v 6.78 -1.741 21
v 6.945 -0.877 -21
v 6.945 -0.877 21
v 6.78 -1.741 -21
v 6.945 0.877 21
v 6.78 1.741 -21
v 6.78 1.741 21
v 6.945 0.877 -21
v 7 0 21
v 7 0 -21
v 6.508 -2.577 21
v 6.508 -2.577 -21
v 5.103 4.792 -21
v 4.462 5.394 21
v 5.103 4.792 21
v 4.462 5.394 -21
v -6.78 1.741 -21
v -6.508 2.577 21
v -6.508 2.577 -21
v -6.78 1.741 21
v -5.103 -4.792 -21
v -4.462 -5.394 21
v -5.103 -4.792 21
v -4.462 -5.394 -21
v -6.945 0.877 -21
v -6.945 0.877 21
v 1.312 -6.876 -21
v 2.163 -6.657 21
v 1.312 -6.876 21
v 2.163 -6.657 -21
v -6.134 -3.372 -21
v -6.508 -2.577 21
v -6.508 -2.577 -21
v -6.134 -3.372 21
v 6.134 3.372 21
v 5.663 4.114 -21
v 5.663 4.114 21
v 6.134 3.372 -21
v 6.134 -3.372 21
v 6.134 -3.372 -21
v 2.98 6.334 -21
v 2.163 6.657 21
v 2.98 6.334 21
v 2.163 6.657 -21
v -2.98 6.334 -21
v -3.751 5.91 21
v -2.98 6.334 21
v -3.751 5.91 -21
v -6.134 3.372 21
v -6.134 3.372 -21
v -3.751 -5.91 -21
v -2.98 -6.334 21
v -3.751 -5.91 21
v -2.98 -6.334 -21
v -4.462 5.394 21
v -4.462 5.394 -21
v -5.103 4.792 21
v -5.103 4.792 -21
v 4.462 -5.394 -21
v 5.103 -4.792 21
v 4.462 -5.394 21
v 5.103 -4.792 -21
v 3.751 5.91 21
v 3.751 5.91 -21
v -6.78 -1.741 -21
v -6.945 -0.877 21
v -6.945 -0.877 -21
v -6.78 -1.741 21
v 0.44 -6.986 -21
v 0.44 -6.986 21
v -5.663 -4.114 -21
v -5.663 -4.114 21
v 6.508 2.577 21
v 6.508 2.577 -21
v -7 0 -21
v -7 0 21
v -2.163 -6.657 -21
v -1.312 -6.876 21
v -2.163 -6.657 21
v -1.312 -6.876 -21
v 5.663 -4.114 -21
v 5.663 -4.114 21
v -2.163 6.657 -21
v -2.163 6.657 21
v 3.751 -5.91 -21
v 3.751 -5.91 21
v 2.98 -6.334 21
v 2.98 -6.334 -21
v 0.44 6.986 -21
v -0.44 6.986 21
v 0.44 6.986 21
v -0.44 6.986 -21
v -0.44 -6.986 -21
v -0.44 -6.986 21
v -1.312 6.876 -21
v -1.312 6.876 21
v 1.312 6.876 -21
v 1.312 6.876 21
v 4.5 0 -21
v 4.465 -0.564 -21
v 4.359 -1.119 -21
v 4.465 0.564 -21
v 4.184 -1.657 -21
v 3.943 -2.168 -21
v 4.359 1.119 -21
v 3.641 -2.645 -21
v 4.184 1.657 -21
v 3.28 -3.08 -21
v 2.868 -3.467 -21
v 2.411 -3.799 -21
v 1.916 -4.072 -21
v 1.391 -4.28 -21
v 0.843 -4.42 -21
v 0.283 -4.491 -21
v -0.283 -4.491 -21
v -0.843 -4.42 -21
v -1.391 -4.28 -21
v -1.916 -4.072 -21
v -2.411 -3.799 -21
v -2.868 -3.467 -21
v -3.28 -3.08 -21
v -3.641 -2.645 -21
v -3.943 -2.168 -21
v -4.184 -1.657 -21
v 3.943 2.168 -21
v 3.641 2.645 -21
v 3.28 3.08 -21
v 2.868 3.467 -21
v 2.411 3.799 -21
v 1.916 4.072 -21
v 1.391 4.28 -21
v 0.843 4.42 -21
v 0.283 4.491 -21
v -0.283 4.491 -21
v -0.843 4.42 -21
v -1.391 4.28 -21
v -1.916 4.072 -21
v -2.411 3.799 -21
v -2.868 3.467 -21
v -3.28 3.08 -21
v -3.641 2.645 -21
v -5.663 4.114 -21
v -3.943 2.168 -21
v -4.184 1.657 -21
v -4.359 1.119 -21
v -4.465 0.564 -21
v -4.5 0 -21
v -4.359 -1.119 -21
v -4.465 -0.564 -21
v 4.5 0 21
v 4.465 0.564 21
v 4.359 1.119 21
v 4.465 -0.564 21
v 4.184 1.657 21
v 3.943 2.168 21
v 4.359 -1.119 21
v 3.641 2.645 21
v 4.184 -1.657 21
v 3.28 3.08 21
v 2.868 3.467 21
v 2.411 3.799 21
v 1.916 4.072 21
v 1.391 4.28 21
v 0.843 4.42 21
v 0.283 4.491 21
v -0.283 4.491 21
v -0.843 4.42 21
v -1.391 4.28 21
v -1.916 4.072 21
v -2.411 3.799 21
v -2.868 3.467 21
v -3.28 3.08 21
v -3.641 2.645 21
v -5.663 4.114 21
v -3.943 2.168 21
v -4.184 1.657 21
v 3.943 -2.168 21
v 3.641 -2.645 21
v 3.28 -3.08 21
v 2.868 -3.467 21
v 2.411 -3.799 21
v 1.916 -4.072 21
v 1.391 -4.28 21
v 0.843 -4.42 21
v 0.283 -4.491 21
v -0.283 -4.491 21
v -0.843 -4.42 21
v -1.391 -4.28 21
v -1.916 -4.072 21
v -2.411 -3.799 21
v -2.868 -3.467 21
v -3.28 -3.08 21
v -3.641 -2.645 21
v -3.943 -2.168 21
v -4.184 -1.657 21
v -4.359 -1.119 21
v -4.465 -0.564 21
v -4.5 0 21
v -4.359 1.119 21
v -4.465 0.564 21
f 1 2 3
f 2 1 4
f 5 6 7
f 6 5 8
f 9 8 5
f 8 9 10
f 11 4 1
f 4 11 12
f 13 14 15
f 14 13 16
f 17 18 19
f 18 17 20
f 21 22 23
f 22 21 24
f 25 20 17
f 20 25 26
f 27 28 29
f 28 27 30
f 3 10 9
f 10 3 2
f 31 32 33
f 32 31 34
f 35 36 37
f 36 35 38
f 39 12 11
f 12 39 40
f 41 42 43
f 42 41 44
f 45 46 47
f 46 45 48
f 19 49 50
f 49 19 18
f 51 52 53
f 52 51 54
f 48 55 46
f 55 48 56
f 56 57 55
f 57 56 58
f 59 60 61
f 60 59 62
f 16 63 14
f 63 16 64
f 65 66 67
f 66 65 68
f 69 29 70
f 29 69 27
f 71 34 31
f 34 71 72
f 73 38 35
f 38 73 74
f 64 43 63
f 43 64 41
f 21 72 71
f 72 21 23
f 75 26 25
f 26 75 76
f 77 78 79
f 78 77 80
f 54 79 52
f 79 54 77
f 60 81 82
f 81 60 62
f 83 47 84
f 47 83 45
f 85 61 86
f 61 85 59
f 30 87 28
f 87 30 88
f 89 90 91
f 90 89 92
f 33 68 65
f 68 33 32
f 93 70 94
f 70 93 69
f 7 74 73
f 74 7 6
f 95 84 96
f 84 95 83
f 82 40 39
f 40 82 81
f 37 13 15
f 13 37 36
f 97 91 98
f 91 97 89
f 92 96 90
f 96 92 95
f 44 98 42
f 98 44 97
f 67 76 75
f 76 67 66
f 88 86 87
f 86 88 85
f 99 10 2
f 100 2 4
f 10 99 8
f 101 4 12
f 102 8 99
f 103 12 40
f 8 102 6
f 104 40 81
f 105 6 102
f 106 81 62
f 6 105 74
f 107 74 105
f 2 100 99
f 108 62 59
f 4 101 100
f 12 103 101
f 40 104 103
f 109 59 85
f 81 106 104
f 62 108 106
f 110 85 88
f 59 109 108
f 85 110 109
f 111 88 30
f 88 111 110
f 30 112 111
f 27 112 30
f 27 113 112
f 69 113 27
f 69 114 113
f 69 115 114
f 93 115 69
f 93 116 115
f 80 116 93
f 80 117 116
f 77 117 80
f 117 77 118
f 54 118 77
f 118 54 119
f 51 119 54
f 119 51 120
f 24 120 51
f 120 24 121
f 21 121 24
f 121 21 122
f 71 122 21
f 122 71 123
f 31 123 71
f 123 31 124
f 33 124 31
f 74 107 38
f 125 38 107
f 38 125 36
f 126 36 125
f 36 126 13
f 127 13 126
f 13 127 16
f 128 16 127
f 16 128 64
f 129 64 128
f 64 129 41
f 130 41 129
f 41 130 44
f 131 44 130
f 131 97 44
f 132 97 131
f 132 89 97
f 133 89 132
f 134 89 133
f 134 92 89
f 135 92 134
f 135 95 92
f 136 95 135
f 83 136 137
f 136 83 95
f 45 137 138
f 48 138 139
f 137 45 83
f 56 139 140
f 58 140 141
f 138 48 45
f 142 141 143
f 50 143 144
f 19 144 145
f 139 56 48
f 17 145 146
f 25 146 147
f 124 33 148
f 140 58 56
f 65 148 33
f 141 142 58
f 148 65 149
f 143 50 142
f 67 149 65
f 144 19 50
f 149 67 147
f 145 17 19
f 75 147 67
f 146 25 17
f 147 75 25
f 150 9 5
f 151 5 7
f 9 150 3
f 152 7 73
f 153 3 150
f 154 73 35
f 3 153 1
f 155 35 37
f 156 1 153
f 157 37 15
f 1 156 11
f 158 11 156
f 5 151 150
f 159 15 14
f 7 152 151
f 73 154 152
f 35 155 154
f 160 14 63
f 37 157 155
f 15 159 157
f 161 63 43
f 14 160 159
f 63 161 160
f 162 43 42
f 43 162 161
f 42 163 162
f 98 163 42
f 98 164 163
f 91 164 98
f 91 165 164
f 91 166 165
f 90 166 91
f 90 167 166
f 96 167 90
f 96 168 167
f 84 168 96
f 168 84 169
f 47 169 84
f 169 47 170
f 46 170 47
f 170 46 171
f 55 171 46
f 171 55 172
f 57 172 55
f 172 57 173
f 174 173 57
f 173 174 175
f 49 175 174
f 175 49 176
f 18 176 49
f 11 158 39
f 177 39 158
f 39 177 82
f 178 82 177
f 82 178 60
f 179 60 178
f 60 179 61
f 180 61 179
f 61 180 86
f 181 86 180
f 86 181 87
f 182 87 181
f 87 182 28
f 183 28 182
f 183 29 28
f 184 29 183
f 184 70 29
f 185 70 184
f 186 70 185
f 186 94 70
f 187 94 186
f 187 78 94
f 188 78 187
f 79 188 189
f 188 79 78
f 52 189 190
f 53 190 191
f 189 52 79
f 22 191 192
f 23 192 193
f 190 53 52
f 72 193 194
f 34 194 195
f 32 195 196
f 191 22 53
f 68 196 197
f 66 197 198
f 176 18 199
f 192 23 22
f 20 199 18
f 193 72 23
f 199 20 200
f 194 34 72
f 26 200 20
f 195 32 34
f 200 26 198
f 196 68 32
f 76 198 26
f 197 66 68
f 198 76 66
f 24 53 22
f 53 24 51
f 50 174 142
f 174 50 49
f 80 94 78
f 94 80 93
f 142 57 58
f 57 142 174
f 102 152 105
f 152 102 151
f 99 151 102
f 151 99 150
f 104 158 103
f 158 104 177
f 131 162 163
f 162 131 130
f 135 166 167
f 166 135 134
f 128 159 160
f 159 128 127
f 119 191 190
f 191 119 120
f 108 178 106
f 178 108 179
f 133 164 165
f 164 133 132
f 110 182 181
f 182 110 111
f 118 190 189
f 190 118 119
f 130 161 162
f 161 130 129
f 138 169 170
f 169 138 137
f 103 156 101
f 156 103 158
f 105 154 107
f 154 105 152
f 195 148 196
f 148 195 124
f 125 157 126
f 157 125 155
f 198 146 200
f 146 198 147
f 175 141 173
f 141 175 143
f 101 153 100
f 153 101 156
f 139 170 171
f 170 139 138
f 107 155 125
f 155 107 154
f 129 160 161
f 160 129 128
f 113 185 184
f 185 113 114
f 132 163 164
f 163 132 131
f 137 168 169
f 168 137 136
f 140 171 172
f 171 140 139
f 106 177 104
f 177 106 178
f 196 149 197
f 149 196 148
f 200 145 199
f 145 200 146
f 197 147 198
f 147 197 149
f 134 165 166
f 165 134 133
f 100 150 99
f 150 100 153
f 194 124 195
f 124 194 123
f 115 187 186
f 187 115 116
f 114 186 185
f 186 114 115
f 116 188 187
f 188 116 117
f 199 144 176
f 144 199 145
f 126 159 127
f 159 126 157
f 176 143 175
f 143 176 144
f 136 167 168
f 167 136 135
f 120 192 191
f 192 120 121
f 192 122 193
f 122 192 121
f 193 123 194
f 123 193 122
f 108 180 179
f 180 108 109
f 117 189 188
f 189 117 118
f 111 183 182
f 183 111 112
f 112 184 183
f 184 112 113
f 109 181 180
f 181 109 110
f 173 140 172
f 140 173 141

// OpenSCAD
$fn = 50;


difference() {
	union() {
		translate(v = [0, 0, -21.0000000000]) {
			cylinder(h = 42, r = 7.0000000000);
		}
	}
	union() {
		translate(v = [0, 0, -100.0000000000]) {
			cylinder(h = 200, r = 4.5000000000);
		}
	}
}
